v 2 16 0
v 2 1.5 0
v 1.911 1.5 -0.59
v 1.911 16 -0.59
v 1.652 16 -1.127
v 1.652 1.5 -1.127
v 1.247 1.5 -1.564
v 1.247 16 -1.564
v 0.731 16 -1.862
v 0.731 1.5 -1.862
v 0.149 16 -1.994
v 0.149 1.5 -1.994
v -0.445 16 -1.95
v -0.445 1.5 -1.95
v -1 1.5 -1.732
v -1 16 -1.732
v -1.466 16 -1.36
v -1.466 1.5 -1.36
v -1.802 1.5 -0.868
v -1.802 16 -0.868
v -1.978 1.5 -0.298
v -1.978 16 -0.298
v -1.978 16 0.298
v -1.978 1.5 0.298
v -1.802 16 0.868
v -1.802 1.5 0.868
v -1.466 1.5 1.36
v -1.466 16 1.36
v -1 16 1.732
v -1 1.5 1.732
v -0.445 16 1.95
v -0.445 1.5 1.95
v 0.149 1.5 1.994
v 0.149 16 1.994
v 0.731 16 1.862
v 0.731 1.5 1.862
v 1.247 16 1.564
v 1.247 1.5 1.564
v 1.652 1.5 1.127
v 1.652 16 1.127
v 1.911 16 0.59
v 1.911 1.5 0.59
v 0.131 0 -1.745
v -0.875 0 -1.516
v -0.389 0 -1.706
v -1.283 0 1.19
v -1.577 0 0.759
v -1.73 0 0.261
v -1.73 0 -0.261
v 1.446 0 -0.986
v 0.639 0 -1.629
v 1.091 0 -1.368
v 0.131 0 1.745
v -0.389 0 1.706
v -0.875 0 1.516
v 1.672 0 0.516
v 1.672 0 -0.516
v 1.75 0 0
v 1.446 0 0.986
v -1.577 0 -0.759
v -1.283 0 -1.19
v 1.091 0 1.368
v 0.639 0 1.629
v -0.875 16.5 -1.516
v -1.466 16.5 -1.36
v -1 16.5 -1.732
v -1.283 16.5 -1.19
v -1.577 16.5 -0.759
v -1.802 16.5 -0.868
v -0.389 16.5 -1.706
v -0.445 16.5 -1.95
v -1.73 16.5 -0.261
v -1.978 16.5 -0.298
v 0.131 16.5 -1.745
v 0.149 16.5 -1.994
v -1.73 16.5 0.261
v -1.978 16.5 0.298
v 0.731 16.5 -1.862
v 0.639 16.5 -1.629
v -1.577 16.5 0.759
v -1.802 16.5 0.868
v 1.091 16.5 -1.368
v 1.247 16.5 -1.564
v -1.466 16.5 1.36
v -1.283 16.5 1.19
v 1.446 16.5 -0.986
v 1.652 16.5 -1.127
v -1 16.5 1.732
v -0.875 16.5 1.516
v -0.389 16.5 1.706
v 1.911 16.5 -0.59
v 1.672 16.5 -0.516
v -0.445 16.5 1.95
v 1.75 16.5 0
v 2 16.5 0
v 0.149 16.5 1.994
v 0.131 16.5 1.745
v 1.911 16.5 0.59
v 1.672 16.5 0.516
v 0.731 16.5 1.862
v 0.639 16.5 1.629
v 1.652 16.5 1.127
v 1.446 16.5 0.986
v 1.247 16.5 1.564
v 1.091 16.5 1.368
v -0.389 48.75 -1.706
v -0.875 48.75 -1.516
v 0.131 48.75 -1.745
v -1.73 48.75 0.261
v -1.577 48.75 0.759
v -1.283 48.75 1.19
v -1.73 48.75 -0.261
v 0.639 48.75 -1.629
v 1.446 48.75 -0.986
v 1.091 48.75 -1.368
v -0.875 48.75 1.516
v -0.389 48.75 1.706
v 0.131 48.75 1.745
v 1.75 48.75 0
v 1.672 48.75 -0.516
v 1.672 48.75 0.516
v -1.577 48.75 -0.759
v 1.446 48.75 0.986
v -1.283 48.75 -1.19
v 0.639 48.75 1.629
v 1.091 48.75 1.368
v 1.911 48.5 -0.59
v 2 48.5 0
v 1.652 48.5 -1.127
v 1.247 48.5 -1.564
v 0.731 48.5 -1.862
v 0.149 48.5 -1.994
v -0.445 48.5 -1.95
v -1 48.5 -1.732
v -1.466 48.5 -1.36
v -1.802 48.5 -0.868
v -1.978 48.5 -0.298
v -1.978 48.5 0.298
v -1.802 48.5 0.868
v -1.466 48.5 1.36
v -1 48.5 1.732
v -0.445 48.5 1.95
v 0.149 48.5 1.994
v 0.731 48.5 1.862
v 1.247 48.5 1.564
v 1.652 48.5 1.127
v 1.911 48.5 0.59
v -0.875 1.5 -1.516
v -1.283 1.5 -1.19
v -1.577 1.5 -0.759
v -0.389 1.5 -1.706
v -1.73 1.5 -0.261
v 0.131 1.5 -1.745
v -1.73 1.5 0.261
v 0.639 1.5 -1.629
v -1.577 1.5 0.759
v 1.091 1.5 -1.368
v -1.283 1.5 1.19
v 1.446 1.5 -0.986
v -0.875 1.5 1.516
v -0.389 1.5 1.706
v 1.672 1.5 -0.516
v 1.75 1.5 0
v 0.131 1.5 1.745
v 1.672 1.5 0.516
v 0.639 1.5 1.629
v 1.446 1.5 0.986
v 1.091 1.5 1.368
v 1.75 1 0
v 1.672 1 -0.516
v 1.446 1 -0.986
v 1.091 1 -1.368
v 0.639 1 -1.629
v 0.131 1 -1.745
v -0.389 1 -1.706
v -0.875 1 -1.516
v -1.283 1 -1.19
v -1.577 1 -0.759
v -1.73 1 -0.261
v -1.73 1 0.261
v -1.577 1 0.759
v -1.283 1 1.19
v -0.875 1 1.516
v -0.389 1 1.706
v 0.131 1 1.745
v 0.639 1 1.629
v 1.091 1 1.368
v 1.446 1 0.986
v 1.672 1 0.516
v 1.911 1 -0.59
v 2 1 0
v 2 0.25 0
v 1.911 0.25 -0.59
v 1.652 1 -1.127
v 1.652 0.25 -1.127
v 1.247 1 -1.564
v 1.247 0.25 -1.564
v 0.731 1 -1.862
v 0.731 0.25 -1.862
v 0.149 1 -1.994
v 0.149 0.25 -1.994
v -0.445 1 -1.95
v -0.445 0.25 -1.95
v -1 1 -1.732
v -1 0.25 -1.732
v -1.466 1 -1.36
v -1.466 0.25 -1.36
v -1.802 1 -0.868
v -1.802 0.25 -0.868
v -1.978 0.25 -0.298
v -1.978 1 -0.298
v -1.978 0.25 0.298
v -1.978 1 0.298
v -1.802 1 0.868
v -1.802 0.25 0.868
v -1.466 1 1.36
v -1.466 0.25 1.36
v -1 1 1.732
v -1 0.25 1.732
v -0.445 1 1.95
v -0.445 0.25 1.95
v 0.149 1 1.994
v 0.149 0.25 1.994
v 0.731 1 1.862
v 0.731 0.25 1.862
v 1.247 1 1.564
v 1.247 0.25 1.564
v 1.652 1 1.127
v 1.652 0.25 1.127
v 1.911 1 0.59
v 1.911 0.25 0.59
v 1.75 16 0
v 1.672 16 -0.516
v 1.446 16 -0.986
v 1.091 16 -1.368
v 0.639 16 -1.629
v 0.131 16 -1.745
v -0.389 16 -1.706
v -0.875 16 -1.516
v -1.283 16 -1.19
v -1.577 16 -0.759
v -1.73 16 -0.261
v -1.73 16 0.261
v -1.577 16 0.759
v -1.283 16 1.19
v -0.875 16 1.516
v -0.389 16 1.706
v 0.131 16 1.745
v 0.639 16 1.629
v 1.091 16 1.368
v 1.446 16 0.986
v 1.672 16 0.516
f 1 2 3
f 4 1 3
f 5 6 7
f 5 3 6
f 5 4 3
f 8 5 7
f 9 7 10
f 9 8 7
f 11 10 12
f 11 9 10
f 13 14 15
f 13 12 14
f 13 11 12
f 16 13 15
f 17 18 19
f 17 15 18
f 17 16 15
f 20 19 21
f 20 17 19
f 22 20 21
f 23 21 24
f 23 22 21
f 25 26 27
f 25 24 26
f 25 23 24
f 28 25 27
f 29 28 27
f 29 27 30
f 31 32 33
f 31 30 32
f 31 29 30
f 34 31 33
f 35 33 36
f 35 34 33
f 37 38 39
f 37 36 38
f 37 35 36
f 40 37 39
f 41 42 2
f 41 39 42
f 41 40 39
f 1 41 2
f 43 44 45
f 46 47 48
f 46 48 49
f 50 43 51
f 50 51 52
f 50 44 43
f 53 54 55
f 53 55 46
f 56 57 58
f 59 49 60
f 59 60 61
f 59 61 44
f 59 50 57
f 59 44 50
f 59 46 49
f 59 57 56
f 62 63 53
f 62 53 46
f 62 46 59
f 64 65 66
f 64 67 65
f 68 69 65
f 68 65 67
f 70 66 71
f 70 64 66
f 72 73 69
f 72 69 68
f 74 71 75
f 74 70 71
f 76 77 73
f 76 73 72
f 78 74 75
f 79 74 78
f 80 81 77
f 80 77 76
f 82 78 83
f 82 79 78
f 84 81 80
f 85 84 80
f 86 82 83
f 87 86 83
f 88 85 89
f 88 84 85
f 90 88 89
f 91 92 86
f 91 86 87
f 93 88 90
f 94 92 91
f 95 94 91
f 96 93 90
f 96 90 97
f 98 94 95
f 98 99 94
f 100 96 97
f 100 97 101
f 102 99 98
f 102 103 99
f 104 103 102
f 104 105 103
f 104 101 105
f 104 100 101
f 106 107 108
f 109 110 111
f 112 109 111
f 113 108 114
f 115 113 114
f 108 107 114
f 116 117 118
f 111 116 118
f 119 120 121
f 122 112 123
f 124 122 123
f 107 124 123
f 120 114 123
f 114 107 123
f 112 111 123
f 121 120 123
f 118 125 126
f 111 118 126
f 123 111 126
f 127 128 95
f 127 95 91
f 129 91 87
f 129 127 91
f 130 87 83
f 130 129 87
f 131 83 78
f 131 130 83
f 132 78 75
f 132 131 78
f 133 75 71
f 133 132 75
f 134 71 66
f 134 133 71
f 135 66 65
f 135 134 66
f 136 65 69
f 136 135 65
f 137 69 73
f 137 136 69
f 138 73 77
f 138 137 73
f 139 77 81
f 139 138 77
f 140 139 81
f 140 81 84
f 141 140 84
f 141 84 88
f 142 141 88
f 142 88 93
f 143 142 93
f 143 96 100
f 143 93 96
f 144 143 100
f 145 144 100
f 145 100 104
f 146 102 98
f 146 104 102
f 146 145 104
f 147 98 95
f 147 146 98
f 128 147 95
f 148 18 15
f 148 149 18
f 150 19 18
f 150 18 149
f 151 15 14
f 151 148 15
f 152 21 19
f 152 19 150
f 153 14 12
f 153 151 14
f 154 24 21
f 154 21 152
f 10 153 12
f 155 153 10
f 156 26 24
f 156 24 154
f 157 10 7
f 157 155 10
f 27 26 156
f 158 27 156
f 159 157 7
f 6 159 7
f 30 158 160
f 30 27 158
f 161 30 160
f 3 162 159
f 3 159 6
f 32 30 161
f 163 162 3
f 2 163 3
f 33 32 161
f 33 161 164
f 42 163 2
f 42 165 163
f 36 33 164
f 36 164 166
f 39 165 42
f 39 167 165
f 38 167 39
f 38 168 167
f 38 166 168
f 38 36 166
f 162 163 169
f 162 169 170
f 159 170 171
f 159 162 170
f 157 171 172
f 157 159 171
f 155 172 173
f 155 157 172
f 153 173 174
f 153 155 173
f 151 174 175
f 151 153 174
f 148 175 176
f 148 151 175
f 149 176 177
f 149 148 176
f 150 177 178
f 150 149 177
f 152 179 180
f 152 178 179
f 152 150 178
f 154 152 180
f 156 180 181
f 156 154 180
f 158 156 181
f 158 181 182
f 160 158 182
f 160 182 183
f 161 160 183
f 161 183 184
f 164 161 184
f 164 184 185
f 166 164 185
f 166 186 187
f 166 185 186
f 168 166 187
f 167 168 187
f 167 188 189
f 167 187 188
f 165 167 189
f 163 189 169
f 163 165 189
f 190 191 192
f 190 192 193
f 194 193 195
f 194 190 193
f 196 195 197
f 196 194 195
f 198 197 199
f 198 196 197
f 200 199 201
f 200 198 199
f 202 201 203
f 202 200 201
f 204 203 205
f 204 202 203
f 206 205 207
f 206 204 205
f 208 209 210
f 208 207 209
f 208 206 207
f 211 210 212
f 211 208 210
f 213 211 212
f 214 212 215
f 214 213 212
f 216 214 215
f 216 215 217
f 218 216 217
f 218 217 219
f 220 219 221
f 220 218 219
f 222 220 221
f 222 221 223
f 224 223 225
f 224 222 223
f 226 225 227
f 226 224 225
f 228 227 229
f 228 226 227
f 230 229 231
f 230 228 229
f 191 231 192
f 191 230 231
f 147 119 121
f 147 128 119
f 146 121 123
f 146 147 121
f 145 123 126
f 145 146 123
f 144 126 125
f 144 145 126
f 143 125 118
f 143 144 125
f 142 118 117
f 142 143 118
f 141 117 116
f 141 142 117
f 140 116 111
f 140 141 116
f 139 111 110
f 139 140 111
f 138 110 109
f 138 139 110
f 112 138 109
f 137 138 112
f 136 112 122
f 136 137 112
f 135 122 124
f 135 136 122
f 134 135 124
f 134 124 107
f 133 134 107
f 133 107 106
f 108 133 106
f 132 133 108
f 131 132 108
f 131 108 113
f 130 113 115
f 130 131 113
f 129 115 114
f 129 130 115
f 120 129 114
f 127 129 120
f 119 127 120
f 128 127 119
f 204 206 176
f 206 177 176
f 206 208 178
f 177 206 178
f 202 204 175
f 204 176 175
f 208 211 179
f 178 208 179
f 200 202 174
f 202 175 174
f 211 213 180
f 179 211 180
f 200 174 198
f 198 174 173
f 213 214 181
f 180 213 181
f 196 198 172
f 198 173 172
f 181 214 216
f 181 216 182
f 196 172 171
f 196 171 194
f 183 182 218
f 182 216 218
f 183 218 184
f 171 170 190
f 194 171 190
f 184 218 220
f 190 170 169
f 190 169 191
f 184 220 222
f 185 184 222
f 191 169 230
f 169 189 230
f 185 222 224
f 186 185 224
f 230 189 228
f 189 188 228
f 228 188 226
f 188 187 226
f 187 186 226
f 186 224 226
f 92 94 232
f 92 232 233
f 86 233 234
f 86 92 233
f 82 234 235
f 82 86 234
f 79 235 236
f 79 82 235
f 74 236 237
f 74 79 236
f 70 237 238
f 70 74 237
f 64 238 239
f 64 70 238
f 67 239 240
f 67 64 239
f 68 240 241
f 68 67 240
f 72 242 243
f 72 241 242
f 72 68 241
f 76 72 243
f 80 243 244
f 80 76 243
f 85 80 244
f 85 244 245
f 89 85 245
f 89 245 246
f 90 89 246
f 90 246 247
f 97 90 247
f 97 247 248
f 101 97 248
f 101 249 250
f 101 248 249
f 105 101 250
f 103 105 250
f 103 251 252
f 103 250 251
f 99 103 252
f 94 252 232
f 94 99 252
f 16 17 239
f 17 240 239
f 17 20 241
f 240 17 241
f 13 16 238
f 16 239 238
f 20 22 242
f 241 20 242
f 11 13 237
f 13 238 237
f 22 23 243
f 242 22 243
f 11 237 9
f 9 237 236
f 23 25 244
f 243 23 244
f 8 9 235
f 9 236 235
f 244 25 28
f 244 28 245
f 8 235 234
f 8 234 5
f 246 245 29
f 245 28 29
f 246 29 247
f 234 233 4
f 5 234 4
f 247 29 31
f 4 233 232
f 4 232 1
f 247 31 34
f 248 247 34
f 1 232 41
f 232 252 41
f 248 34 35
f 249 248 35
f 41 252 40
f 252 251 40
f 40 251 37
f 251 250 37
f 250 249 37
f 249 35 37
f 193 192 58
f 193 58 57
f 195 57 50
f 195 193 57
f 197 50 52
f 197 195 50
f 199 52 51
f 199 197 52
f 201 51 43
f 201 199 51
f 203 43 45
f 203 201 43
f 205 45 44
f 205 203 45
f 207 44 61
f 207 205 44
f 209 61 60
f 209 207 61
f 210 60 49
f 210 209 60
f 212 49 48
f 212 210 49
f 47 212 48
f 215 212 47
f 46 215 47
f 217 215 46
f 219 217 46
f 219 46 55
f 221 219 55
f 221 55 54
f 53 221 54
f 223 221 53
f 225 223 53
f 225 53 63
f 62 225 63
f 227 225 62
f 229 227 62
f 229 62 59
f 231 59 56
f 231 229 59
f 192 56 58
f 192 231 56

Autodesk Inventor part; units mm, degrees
ref_plane "YZ Plane" through (0, 0, 0) normal (1, 0, 0) x (0, 1, 0)
ref_plane "XZ Plane" through (0, 0, 0) normal (0, 1, 0) x (-1, 0, 0)
ref_plane "XY Plane" through (0, 0, 0) normal (0, 0, 1) x (1, 0, 0)
sketch "Sketch2" plane through (0, 0, 0) normal (0, 0, 1) x (1, 0, 0)
  line L0 (0, 0) -> (2, 0)
  line L1 (2, 0) -> (2, 48.75)
  line L2 (2, 48.75) -> (0, 48.75)
  line L3 (0, 48.75) -> (0, 0)
  line L4 (2, 1) -> (1.75, 1)
  line L5 (1.75, 1) -> (1.75, 1.5)
  line L6 (1.75, 1.5) -> (2, 1.5)
  line L7 (2, 1.5) -> (2, 1)
  line L8 (2, 16) -> (1.75, 16)
  line L9 (1.75, 16) -> (1.75, 16.5)
  line L10 (1.75, 16.5) -> (2, 16.5)
  line L11 (2, 16.5) -> (2, 16)
  dimension "d3" = 2
  dimension "d4" = 48.75
  dimension "d5" = 1
  dimension "d6" = 0.5
  dimension "d7" = 0.25
  dimension "d8" = 16
  dimension "d9" = 0.5
  dimension "d10" = 0.25
revolve "Revolution1" add sketch "Sketch2" angle 360 about axis through (0, 48.75, 0) along (0, -1, 0) contours L3 L2 L1 L10 L9 L8 L6 L5 L4 L0
chamfer "Chamfer1" distance 0.25 angle 45 2 edges at (-2, 48.75, 0) (-2, 0, 0)
properties part number "SHAFT"
